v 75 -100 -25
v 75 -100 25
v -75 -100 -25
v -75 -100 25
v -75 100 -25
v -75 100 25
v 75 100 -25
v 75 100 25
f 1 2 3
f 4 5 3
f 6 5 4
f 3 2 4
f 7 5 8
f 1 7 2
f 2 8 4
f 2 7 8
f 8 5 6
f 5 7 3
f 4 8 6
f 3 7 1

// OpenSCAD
box_Bot_Width = 150; //[0:0.1:250]
box_Bot_Length = 200; //[0:0.1:250]
box_Front_Height = 50; //[0:0.1:250]

box_Top_Width = 0; //[0:0.1:250]
box_Top_Length = 0; //[0:0.1:250]
box_Back_Height = 0; //[0:0.1:250]

box_Rounded_Corner_Diameter = 0; //[0:0.1:50]

box_Rounded_Corner_Diam = 0.00002 + box_Rounded_Corner_Diameter;


if (box_Top_Width == 0) {
    box_Top_WidthX = box_Bot_Width;
}

if (box_Top_Length == 0) {
    box_Top_LengthX = box_Bot_Length;
}

if (box_Back_Height == 0) {
    box_Back_HeightX = box_Front_Height;
}

hull() {
    
    if (box_Top_Width == 0 && box_Top_Length == 0 && box_Back_Height == 0) {
        // BOT
        edge_Ball([-box_Bot_Width/2, -box_Bot_Length/2, -box_Front_Height/2], box_Rounded_Corner_Diam);
        edge_Ball([box_Bot_Width/2, -box_Bot_Length/2, -box_Front_Height/2], box_Rounded_Corner_Diam);
        edge_Ball([box_Bot_Width/2, box_Bot_Length/2, -box_Front_Height/2], box_Rounded_Corner_Diam);
        edge_Ball([-box_Bot_Width/2, box_Bot_Length/2, -box_Front_Height/2], box_Rounded_Corner_Diam);
        
        //TOP
        edge_Ball([-box_Bot_Width/2, -box_Bot_Length/2, box_Front_Height/2], box_Rounded_Corner_Diam);
        edge_Ball([box_Bot_Width/2, -box_Bot_Length/2, box_Front_Height/2], box_Rounded_Corner_Diam);
        edge_Ball([box_Bot_Width/2, box_Bot_Length/2, box_Front_Height/2], box_Rounded_Corner_Diam);
        edge_Ball([-box_Bot_Width/2, box_Bot_Length/2, box_Front_Height/2], box_Rounded_Corner_Diam);
    }
    else if (box_Top_Width == 0 && box_Top_Length == 0) {
        edge_Ball([-box_Bot_Width/2, -box_Bot_Length/2, -box_Front_Height/2], box_Rounded_Corner_Diam);
        edge_Ball([box_Bot_Width/2, -box_Bot_Length/2, -box_Front_Height/2], box_Rounded_Corner_Diam);
        edge_Ball([box_Bot_Width/2, box_Bot_Length/2, -box_Back_Height/2], box_Rounded_Corner_Diam);
        edge_Ball([-box_Bot_Width/2, box_Bot_Length/2, -box_Back_Height/2], box_Rounded_Corner_Diam);
        
        edge_Ball([-box_Bot_Width/2, -box_Bot_Length/2, box_Front_Height/2], box_Rounded_Corner_Diam);
        edge_Ball([box_Bot_Width/2, -box_Bot_Length/2, box_Front_Height/2], box_Rounded_Corner_Diam);
        edge_Ball([box_Bot_Width/2, box_Bot_Length/2, box_Back_Height/2], box_Rounded_Corner_Diam);
        edge_Ball([-box_Bot_Width/2, box_Bot_Length/2, box_Back_Height/2], box_Rounded_Corner_Diam);
    }
    else if (box_Top_Width == 0 && box_Back_Height == 0) {
        edge_Ball([-box_Bot_Width/2, -box_Bot_Length/2, -box_Front_Height/2], box_Rounded_Corner_Diam);
        edge_Ball([box_Bot_Width/2, -box_Bot_Length/2, -box_Front_Height/2], box_Rounded_Corner_Diam);
        edge_Ball([box_Bot_Width/2, box_Bot_Length/2, -box_Front_Height/2], box_Rounded_Corner_Diam);
        edge_Ball([-box_Bot_Width/2, box_Bot_Length/2, -box_Front_Height/2], box_Rounded_Corner_Diam);
        
        edge_Ball([-box_Bot_Width/2, -box_Top_Length/2, box_Front_Height/2], box_Rounded_Corner_Diam);
        edge_Ball([box_Bot_Width/2, -box_Top_Length/2, box_Front_Height/2], box_Rounded_Corner_Diam);
        edge_Ball([box_Bot_Width/2, box_Top_Length/2, box_Front_Height/2], box_Rounded_Corner_Diam);
        edge_Ball([-box_Bot_Width/2, box_Top_Length/2, box_Front_Height/2], box_Rounded_Corner_Diam);
    }
    else if (box_Top_Length == 0 && box_Back_Height == 0) {
        edge_Ball([-box_Bot_Width/2, -box_Bot_Length/2, -box_Front_Height/2], box_Rounded_Corner_Diam);
        edge_Ball([box_Bot_Width/2, -box_Bot_Length/2, -box_Front_Height/2], box_Rounded_Corner_Diam);
        edge_Ball([box_Bot_Width/2, box_Bot_Length/2, -box_Front_Height/2], box_Rounded_Corner_Diam);
        edge_Ball([-box_Bot_Width/2, box_Bot_Length/2, -box_Front_Height/2], box_Rounded_Corner_Diam);
        
        edge_Ball([-box_Top_Width/2, -box_Bot_Length/2, box_Front_Height/2], box_Rounded_Corner_Diam);
        edge_Ball([box_Top_Width/2, -box_Bot_Length/2, box_Front_Height/2], box_Rounded_Corner_Diam);
        edge_Ball([box_Top_Width/2, box_Bot_Length/2, box_Front_Height/2], box_Rounded_Corner_Diam);
        edge_Ball([-box_Top_Width/2, box_Bot_Length/2, box_Front_Height/2], box_Rounded_Corner_Diam);
    }
    else if (box_Top_Width == 0) {
        edge_Ball([-box_Bot_Width/2, -box_Bot_Length/2, -box_Front_Height/2], box_Rounded_Corner_Diam);
        edge_Ball([box_Bot_Width/2, -box_Bot_Length/2, -box_Front_Height/2], box_Rounded_Corner_Diam);
        edge_Ball([box_Bot_Width/2, box_Bot_Length/2, -box_Back_Height/2], box_Rounded_Corner_Diam);
        edge_Ball([-box_Bot_Width/2, box_Bot_Length/2, -box_Back_Height/2], box_Rounded_Corner_Diam);
        
        edge_Ball([-box_Bot_Width/2, -box_Top_Length/2, box_Front_Height/2], box_Rounded_Corner_Diam);
        edge_Ball([box_Bot_Width/2, -box_Top_Length/2, box_Front_Height/2], box_Rounded_Corner_Diam);
        edge_Ball([box_Bot_Width/2, box_Top_Length/2, box_Back_Height/2], box_Rounded_Corner_Diam);
        edge_Ball([-box_Bot_Width/2, box_Top_Length/2, box_Back_Height/2], box_Rounded_Corner_Diam);
    }
    else if (box_Top_Length == 0) {
        edge_Ball([-box_Bot_Width/2, -box_Bot_Length/2, -box_Front_Height/2], box_Rounded_Corner_Diam);
        edge_Ball([box_Bot_Width/2, -box_Bot_Length/2, -box_Front_Height/2], box_Rounded_Corner_Diam);
        edge_Ball([box_Bot_Width/2, box_Bot_Length/2, -box_Back_Height/2], box_Rounded_Corner_Diam);
        edge_Ball([-box_Bot_Width/2, box_Bot_Length/2, -box_Back_Height/2], box_Rounded_Corner_Diam);
        
        edge_Ball([-box_Top_Width/2, -box_Bot_Length/2, box_Front_Height/2], box_Rounded_Corner_Diam);
        edge_Ball([box_Top_Width/2, -box_Bot_Length/2, box_Front_Height/2], box_Rounded_Corner_Diam);
        edge_Ball([box_Top_Width/2, box_Bot_Length/2, box_Back_Height/2], box_Rounded_Corner_Diam);
        edge_Ball([-box_Top_Width/2, box_Bot_Length/2, box_Back_Height/2], box_Rounded_Corner_Diam);
    }
    else if (box_Back_Height == 0) {
        edge_Ball([-box_Bot_Width/2, -box_Bot_Length/2, -box_Front_Height/2], box_Rounded_Corner_Diam);
        edge_Ball([box_Bot_Width/2, -box_Bot_Length/2, -box_Front_Height/2], box_Rounded_Corner_Diam);
        edge_Ball([box_Bot_Width/2, box_Bot_Length/2, -box_Front_Height/2], box_Rounded_Corner_Diam);
        edge_Ball([-box_Bot_Width/2, box_Bot_Length/2, -box_Front_Height/2], box_Rounded_Corner_Diam);
        
        edge_Ball([-box_Top_Width/2, -box_Top_Length/2, box_Front_Height/2], box_Rounded_Corner_Diam);
        edge_Ball([box_Top_Width/2, -box_Top_Length/2, box_Front_Height/2], box_Rounded_Corner_Diam);
        edge_Ball([box_Top_Width/2, box_Top_Length/2, box_Front_Height/2], box_Rounded_Corner_Diam);
        edge_Ball([-box_Top_Width/2, box_Top_Length/2, box_Front_Height/2], box_Rounded_Corner_Diam);
    }
    else {
        edge_Ball([-box_Bot_Width/2, -box_Bot_Length/2, -box_Front_Height/2], box_Rounded_Corner_Diam);
        edge_Ball([box_Bot_Width/2, -box_Bot_Length/2, -box_Front_Height/2], box_Rounded_Corner_Diam);
        edge_Ball([box_Bot_Width/2, box_Bot_Length/2, -box_Back_Height/2], box_Rounded_Corner_Diam);
        edge_Ball([-box_Bot_Width/2, box_Bot_Length/2, -box_Back_Height/2], box_Rounded_Corner_Diam);
        
        edge_Ball([-box_Top_Width/2, -box_Top_Length/2, box_Front_Height/2], box_Rounded_Corner_Diam);
        edge_Ball([box_Top_Width/2, -box_Top_Length/2, box_Front_Height/2], box_Rounded_Corner_Diam);
        edge_Ball([box_Top_Width/2, box_Top_Length/2, box_Back_Height/2], box_Rounded_Corner_Diam);
        edge_Ball([-box_Top_Width/2, box_Top_Length/2, box_Back_Height/2], box_Rounded_Corner_Diam);
    }
}

module edge_Ball(pos, diam) {
    $fs = 1;
    $fa = 4;
    translate(pos)
    sphere(d=diam);
}
